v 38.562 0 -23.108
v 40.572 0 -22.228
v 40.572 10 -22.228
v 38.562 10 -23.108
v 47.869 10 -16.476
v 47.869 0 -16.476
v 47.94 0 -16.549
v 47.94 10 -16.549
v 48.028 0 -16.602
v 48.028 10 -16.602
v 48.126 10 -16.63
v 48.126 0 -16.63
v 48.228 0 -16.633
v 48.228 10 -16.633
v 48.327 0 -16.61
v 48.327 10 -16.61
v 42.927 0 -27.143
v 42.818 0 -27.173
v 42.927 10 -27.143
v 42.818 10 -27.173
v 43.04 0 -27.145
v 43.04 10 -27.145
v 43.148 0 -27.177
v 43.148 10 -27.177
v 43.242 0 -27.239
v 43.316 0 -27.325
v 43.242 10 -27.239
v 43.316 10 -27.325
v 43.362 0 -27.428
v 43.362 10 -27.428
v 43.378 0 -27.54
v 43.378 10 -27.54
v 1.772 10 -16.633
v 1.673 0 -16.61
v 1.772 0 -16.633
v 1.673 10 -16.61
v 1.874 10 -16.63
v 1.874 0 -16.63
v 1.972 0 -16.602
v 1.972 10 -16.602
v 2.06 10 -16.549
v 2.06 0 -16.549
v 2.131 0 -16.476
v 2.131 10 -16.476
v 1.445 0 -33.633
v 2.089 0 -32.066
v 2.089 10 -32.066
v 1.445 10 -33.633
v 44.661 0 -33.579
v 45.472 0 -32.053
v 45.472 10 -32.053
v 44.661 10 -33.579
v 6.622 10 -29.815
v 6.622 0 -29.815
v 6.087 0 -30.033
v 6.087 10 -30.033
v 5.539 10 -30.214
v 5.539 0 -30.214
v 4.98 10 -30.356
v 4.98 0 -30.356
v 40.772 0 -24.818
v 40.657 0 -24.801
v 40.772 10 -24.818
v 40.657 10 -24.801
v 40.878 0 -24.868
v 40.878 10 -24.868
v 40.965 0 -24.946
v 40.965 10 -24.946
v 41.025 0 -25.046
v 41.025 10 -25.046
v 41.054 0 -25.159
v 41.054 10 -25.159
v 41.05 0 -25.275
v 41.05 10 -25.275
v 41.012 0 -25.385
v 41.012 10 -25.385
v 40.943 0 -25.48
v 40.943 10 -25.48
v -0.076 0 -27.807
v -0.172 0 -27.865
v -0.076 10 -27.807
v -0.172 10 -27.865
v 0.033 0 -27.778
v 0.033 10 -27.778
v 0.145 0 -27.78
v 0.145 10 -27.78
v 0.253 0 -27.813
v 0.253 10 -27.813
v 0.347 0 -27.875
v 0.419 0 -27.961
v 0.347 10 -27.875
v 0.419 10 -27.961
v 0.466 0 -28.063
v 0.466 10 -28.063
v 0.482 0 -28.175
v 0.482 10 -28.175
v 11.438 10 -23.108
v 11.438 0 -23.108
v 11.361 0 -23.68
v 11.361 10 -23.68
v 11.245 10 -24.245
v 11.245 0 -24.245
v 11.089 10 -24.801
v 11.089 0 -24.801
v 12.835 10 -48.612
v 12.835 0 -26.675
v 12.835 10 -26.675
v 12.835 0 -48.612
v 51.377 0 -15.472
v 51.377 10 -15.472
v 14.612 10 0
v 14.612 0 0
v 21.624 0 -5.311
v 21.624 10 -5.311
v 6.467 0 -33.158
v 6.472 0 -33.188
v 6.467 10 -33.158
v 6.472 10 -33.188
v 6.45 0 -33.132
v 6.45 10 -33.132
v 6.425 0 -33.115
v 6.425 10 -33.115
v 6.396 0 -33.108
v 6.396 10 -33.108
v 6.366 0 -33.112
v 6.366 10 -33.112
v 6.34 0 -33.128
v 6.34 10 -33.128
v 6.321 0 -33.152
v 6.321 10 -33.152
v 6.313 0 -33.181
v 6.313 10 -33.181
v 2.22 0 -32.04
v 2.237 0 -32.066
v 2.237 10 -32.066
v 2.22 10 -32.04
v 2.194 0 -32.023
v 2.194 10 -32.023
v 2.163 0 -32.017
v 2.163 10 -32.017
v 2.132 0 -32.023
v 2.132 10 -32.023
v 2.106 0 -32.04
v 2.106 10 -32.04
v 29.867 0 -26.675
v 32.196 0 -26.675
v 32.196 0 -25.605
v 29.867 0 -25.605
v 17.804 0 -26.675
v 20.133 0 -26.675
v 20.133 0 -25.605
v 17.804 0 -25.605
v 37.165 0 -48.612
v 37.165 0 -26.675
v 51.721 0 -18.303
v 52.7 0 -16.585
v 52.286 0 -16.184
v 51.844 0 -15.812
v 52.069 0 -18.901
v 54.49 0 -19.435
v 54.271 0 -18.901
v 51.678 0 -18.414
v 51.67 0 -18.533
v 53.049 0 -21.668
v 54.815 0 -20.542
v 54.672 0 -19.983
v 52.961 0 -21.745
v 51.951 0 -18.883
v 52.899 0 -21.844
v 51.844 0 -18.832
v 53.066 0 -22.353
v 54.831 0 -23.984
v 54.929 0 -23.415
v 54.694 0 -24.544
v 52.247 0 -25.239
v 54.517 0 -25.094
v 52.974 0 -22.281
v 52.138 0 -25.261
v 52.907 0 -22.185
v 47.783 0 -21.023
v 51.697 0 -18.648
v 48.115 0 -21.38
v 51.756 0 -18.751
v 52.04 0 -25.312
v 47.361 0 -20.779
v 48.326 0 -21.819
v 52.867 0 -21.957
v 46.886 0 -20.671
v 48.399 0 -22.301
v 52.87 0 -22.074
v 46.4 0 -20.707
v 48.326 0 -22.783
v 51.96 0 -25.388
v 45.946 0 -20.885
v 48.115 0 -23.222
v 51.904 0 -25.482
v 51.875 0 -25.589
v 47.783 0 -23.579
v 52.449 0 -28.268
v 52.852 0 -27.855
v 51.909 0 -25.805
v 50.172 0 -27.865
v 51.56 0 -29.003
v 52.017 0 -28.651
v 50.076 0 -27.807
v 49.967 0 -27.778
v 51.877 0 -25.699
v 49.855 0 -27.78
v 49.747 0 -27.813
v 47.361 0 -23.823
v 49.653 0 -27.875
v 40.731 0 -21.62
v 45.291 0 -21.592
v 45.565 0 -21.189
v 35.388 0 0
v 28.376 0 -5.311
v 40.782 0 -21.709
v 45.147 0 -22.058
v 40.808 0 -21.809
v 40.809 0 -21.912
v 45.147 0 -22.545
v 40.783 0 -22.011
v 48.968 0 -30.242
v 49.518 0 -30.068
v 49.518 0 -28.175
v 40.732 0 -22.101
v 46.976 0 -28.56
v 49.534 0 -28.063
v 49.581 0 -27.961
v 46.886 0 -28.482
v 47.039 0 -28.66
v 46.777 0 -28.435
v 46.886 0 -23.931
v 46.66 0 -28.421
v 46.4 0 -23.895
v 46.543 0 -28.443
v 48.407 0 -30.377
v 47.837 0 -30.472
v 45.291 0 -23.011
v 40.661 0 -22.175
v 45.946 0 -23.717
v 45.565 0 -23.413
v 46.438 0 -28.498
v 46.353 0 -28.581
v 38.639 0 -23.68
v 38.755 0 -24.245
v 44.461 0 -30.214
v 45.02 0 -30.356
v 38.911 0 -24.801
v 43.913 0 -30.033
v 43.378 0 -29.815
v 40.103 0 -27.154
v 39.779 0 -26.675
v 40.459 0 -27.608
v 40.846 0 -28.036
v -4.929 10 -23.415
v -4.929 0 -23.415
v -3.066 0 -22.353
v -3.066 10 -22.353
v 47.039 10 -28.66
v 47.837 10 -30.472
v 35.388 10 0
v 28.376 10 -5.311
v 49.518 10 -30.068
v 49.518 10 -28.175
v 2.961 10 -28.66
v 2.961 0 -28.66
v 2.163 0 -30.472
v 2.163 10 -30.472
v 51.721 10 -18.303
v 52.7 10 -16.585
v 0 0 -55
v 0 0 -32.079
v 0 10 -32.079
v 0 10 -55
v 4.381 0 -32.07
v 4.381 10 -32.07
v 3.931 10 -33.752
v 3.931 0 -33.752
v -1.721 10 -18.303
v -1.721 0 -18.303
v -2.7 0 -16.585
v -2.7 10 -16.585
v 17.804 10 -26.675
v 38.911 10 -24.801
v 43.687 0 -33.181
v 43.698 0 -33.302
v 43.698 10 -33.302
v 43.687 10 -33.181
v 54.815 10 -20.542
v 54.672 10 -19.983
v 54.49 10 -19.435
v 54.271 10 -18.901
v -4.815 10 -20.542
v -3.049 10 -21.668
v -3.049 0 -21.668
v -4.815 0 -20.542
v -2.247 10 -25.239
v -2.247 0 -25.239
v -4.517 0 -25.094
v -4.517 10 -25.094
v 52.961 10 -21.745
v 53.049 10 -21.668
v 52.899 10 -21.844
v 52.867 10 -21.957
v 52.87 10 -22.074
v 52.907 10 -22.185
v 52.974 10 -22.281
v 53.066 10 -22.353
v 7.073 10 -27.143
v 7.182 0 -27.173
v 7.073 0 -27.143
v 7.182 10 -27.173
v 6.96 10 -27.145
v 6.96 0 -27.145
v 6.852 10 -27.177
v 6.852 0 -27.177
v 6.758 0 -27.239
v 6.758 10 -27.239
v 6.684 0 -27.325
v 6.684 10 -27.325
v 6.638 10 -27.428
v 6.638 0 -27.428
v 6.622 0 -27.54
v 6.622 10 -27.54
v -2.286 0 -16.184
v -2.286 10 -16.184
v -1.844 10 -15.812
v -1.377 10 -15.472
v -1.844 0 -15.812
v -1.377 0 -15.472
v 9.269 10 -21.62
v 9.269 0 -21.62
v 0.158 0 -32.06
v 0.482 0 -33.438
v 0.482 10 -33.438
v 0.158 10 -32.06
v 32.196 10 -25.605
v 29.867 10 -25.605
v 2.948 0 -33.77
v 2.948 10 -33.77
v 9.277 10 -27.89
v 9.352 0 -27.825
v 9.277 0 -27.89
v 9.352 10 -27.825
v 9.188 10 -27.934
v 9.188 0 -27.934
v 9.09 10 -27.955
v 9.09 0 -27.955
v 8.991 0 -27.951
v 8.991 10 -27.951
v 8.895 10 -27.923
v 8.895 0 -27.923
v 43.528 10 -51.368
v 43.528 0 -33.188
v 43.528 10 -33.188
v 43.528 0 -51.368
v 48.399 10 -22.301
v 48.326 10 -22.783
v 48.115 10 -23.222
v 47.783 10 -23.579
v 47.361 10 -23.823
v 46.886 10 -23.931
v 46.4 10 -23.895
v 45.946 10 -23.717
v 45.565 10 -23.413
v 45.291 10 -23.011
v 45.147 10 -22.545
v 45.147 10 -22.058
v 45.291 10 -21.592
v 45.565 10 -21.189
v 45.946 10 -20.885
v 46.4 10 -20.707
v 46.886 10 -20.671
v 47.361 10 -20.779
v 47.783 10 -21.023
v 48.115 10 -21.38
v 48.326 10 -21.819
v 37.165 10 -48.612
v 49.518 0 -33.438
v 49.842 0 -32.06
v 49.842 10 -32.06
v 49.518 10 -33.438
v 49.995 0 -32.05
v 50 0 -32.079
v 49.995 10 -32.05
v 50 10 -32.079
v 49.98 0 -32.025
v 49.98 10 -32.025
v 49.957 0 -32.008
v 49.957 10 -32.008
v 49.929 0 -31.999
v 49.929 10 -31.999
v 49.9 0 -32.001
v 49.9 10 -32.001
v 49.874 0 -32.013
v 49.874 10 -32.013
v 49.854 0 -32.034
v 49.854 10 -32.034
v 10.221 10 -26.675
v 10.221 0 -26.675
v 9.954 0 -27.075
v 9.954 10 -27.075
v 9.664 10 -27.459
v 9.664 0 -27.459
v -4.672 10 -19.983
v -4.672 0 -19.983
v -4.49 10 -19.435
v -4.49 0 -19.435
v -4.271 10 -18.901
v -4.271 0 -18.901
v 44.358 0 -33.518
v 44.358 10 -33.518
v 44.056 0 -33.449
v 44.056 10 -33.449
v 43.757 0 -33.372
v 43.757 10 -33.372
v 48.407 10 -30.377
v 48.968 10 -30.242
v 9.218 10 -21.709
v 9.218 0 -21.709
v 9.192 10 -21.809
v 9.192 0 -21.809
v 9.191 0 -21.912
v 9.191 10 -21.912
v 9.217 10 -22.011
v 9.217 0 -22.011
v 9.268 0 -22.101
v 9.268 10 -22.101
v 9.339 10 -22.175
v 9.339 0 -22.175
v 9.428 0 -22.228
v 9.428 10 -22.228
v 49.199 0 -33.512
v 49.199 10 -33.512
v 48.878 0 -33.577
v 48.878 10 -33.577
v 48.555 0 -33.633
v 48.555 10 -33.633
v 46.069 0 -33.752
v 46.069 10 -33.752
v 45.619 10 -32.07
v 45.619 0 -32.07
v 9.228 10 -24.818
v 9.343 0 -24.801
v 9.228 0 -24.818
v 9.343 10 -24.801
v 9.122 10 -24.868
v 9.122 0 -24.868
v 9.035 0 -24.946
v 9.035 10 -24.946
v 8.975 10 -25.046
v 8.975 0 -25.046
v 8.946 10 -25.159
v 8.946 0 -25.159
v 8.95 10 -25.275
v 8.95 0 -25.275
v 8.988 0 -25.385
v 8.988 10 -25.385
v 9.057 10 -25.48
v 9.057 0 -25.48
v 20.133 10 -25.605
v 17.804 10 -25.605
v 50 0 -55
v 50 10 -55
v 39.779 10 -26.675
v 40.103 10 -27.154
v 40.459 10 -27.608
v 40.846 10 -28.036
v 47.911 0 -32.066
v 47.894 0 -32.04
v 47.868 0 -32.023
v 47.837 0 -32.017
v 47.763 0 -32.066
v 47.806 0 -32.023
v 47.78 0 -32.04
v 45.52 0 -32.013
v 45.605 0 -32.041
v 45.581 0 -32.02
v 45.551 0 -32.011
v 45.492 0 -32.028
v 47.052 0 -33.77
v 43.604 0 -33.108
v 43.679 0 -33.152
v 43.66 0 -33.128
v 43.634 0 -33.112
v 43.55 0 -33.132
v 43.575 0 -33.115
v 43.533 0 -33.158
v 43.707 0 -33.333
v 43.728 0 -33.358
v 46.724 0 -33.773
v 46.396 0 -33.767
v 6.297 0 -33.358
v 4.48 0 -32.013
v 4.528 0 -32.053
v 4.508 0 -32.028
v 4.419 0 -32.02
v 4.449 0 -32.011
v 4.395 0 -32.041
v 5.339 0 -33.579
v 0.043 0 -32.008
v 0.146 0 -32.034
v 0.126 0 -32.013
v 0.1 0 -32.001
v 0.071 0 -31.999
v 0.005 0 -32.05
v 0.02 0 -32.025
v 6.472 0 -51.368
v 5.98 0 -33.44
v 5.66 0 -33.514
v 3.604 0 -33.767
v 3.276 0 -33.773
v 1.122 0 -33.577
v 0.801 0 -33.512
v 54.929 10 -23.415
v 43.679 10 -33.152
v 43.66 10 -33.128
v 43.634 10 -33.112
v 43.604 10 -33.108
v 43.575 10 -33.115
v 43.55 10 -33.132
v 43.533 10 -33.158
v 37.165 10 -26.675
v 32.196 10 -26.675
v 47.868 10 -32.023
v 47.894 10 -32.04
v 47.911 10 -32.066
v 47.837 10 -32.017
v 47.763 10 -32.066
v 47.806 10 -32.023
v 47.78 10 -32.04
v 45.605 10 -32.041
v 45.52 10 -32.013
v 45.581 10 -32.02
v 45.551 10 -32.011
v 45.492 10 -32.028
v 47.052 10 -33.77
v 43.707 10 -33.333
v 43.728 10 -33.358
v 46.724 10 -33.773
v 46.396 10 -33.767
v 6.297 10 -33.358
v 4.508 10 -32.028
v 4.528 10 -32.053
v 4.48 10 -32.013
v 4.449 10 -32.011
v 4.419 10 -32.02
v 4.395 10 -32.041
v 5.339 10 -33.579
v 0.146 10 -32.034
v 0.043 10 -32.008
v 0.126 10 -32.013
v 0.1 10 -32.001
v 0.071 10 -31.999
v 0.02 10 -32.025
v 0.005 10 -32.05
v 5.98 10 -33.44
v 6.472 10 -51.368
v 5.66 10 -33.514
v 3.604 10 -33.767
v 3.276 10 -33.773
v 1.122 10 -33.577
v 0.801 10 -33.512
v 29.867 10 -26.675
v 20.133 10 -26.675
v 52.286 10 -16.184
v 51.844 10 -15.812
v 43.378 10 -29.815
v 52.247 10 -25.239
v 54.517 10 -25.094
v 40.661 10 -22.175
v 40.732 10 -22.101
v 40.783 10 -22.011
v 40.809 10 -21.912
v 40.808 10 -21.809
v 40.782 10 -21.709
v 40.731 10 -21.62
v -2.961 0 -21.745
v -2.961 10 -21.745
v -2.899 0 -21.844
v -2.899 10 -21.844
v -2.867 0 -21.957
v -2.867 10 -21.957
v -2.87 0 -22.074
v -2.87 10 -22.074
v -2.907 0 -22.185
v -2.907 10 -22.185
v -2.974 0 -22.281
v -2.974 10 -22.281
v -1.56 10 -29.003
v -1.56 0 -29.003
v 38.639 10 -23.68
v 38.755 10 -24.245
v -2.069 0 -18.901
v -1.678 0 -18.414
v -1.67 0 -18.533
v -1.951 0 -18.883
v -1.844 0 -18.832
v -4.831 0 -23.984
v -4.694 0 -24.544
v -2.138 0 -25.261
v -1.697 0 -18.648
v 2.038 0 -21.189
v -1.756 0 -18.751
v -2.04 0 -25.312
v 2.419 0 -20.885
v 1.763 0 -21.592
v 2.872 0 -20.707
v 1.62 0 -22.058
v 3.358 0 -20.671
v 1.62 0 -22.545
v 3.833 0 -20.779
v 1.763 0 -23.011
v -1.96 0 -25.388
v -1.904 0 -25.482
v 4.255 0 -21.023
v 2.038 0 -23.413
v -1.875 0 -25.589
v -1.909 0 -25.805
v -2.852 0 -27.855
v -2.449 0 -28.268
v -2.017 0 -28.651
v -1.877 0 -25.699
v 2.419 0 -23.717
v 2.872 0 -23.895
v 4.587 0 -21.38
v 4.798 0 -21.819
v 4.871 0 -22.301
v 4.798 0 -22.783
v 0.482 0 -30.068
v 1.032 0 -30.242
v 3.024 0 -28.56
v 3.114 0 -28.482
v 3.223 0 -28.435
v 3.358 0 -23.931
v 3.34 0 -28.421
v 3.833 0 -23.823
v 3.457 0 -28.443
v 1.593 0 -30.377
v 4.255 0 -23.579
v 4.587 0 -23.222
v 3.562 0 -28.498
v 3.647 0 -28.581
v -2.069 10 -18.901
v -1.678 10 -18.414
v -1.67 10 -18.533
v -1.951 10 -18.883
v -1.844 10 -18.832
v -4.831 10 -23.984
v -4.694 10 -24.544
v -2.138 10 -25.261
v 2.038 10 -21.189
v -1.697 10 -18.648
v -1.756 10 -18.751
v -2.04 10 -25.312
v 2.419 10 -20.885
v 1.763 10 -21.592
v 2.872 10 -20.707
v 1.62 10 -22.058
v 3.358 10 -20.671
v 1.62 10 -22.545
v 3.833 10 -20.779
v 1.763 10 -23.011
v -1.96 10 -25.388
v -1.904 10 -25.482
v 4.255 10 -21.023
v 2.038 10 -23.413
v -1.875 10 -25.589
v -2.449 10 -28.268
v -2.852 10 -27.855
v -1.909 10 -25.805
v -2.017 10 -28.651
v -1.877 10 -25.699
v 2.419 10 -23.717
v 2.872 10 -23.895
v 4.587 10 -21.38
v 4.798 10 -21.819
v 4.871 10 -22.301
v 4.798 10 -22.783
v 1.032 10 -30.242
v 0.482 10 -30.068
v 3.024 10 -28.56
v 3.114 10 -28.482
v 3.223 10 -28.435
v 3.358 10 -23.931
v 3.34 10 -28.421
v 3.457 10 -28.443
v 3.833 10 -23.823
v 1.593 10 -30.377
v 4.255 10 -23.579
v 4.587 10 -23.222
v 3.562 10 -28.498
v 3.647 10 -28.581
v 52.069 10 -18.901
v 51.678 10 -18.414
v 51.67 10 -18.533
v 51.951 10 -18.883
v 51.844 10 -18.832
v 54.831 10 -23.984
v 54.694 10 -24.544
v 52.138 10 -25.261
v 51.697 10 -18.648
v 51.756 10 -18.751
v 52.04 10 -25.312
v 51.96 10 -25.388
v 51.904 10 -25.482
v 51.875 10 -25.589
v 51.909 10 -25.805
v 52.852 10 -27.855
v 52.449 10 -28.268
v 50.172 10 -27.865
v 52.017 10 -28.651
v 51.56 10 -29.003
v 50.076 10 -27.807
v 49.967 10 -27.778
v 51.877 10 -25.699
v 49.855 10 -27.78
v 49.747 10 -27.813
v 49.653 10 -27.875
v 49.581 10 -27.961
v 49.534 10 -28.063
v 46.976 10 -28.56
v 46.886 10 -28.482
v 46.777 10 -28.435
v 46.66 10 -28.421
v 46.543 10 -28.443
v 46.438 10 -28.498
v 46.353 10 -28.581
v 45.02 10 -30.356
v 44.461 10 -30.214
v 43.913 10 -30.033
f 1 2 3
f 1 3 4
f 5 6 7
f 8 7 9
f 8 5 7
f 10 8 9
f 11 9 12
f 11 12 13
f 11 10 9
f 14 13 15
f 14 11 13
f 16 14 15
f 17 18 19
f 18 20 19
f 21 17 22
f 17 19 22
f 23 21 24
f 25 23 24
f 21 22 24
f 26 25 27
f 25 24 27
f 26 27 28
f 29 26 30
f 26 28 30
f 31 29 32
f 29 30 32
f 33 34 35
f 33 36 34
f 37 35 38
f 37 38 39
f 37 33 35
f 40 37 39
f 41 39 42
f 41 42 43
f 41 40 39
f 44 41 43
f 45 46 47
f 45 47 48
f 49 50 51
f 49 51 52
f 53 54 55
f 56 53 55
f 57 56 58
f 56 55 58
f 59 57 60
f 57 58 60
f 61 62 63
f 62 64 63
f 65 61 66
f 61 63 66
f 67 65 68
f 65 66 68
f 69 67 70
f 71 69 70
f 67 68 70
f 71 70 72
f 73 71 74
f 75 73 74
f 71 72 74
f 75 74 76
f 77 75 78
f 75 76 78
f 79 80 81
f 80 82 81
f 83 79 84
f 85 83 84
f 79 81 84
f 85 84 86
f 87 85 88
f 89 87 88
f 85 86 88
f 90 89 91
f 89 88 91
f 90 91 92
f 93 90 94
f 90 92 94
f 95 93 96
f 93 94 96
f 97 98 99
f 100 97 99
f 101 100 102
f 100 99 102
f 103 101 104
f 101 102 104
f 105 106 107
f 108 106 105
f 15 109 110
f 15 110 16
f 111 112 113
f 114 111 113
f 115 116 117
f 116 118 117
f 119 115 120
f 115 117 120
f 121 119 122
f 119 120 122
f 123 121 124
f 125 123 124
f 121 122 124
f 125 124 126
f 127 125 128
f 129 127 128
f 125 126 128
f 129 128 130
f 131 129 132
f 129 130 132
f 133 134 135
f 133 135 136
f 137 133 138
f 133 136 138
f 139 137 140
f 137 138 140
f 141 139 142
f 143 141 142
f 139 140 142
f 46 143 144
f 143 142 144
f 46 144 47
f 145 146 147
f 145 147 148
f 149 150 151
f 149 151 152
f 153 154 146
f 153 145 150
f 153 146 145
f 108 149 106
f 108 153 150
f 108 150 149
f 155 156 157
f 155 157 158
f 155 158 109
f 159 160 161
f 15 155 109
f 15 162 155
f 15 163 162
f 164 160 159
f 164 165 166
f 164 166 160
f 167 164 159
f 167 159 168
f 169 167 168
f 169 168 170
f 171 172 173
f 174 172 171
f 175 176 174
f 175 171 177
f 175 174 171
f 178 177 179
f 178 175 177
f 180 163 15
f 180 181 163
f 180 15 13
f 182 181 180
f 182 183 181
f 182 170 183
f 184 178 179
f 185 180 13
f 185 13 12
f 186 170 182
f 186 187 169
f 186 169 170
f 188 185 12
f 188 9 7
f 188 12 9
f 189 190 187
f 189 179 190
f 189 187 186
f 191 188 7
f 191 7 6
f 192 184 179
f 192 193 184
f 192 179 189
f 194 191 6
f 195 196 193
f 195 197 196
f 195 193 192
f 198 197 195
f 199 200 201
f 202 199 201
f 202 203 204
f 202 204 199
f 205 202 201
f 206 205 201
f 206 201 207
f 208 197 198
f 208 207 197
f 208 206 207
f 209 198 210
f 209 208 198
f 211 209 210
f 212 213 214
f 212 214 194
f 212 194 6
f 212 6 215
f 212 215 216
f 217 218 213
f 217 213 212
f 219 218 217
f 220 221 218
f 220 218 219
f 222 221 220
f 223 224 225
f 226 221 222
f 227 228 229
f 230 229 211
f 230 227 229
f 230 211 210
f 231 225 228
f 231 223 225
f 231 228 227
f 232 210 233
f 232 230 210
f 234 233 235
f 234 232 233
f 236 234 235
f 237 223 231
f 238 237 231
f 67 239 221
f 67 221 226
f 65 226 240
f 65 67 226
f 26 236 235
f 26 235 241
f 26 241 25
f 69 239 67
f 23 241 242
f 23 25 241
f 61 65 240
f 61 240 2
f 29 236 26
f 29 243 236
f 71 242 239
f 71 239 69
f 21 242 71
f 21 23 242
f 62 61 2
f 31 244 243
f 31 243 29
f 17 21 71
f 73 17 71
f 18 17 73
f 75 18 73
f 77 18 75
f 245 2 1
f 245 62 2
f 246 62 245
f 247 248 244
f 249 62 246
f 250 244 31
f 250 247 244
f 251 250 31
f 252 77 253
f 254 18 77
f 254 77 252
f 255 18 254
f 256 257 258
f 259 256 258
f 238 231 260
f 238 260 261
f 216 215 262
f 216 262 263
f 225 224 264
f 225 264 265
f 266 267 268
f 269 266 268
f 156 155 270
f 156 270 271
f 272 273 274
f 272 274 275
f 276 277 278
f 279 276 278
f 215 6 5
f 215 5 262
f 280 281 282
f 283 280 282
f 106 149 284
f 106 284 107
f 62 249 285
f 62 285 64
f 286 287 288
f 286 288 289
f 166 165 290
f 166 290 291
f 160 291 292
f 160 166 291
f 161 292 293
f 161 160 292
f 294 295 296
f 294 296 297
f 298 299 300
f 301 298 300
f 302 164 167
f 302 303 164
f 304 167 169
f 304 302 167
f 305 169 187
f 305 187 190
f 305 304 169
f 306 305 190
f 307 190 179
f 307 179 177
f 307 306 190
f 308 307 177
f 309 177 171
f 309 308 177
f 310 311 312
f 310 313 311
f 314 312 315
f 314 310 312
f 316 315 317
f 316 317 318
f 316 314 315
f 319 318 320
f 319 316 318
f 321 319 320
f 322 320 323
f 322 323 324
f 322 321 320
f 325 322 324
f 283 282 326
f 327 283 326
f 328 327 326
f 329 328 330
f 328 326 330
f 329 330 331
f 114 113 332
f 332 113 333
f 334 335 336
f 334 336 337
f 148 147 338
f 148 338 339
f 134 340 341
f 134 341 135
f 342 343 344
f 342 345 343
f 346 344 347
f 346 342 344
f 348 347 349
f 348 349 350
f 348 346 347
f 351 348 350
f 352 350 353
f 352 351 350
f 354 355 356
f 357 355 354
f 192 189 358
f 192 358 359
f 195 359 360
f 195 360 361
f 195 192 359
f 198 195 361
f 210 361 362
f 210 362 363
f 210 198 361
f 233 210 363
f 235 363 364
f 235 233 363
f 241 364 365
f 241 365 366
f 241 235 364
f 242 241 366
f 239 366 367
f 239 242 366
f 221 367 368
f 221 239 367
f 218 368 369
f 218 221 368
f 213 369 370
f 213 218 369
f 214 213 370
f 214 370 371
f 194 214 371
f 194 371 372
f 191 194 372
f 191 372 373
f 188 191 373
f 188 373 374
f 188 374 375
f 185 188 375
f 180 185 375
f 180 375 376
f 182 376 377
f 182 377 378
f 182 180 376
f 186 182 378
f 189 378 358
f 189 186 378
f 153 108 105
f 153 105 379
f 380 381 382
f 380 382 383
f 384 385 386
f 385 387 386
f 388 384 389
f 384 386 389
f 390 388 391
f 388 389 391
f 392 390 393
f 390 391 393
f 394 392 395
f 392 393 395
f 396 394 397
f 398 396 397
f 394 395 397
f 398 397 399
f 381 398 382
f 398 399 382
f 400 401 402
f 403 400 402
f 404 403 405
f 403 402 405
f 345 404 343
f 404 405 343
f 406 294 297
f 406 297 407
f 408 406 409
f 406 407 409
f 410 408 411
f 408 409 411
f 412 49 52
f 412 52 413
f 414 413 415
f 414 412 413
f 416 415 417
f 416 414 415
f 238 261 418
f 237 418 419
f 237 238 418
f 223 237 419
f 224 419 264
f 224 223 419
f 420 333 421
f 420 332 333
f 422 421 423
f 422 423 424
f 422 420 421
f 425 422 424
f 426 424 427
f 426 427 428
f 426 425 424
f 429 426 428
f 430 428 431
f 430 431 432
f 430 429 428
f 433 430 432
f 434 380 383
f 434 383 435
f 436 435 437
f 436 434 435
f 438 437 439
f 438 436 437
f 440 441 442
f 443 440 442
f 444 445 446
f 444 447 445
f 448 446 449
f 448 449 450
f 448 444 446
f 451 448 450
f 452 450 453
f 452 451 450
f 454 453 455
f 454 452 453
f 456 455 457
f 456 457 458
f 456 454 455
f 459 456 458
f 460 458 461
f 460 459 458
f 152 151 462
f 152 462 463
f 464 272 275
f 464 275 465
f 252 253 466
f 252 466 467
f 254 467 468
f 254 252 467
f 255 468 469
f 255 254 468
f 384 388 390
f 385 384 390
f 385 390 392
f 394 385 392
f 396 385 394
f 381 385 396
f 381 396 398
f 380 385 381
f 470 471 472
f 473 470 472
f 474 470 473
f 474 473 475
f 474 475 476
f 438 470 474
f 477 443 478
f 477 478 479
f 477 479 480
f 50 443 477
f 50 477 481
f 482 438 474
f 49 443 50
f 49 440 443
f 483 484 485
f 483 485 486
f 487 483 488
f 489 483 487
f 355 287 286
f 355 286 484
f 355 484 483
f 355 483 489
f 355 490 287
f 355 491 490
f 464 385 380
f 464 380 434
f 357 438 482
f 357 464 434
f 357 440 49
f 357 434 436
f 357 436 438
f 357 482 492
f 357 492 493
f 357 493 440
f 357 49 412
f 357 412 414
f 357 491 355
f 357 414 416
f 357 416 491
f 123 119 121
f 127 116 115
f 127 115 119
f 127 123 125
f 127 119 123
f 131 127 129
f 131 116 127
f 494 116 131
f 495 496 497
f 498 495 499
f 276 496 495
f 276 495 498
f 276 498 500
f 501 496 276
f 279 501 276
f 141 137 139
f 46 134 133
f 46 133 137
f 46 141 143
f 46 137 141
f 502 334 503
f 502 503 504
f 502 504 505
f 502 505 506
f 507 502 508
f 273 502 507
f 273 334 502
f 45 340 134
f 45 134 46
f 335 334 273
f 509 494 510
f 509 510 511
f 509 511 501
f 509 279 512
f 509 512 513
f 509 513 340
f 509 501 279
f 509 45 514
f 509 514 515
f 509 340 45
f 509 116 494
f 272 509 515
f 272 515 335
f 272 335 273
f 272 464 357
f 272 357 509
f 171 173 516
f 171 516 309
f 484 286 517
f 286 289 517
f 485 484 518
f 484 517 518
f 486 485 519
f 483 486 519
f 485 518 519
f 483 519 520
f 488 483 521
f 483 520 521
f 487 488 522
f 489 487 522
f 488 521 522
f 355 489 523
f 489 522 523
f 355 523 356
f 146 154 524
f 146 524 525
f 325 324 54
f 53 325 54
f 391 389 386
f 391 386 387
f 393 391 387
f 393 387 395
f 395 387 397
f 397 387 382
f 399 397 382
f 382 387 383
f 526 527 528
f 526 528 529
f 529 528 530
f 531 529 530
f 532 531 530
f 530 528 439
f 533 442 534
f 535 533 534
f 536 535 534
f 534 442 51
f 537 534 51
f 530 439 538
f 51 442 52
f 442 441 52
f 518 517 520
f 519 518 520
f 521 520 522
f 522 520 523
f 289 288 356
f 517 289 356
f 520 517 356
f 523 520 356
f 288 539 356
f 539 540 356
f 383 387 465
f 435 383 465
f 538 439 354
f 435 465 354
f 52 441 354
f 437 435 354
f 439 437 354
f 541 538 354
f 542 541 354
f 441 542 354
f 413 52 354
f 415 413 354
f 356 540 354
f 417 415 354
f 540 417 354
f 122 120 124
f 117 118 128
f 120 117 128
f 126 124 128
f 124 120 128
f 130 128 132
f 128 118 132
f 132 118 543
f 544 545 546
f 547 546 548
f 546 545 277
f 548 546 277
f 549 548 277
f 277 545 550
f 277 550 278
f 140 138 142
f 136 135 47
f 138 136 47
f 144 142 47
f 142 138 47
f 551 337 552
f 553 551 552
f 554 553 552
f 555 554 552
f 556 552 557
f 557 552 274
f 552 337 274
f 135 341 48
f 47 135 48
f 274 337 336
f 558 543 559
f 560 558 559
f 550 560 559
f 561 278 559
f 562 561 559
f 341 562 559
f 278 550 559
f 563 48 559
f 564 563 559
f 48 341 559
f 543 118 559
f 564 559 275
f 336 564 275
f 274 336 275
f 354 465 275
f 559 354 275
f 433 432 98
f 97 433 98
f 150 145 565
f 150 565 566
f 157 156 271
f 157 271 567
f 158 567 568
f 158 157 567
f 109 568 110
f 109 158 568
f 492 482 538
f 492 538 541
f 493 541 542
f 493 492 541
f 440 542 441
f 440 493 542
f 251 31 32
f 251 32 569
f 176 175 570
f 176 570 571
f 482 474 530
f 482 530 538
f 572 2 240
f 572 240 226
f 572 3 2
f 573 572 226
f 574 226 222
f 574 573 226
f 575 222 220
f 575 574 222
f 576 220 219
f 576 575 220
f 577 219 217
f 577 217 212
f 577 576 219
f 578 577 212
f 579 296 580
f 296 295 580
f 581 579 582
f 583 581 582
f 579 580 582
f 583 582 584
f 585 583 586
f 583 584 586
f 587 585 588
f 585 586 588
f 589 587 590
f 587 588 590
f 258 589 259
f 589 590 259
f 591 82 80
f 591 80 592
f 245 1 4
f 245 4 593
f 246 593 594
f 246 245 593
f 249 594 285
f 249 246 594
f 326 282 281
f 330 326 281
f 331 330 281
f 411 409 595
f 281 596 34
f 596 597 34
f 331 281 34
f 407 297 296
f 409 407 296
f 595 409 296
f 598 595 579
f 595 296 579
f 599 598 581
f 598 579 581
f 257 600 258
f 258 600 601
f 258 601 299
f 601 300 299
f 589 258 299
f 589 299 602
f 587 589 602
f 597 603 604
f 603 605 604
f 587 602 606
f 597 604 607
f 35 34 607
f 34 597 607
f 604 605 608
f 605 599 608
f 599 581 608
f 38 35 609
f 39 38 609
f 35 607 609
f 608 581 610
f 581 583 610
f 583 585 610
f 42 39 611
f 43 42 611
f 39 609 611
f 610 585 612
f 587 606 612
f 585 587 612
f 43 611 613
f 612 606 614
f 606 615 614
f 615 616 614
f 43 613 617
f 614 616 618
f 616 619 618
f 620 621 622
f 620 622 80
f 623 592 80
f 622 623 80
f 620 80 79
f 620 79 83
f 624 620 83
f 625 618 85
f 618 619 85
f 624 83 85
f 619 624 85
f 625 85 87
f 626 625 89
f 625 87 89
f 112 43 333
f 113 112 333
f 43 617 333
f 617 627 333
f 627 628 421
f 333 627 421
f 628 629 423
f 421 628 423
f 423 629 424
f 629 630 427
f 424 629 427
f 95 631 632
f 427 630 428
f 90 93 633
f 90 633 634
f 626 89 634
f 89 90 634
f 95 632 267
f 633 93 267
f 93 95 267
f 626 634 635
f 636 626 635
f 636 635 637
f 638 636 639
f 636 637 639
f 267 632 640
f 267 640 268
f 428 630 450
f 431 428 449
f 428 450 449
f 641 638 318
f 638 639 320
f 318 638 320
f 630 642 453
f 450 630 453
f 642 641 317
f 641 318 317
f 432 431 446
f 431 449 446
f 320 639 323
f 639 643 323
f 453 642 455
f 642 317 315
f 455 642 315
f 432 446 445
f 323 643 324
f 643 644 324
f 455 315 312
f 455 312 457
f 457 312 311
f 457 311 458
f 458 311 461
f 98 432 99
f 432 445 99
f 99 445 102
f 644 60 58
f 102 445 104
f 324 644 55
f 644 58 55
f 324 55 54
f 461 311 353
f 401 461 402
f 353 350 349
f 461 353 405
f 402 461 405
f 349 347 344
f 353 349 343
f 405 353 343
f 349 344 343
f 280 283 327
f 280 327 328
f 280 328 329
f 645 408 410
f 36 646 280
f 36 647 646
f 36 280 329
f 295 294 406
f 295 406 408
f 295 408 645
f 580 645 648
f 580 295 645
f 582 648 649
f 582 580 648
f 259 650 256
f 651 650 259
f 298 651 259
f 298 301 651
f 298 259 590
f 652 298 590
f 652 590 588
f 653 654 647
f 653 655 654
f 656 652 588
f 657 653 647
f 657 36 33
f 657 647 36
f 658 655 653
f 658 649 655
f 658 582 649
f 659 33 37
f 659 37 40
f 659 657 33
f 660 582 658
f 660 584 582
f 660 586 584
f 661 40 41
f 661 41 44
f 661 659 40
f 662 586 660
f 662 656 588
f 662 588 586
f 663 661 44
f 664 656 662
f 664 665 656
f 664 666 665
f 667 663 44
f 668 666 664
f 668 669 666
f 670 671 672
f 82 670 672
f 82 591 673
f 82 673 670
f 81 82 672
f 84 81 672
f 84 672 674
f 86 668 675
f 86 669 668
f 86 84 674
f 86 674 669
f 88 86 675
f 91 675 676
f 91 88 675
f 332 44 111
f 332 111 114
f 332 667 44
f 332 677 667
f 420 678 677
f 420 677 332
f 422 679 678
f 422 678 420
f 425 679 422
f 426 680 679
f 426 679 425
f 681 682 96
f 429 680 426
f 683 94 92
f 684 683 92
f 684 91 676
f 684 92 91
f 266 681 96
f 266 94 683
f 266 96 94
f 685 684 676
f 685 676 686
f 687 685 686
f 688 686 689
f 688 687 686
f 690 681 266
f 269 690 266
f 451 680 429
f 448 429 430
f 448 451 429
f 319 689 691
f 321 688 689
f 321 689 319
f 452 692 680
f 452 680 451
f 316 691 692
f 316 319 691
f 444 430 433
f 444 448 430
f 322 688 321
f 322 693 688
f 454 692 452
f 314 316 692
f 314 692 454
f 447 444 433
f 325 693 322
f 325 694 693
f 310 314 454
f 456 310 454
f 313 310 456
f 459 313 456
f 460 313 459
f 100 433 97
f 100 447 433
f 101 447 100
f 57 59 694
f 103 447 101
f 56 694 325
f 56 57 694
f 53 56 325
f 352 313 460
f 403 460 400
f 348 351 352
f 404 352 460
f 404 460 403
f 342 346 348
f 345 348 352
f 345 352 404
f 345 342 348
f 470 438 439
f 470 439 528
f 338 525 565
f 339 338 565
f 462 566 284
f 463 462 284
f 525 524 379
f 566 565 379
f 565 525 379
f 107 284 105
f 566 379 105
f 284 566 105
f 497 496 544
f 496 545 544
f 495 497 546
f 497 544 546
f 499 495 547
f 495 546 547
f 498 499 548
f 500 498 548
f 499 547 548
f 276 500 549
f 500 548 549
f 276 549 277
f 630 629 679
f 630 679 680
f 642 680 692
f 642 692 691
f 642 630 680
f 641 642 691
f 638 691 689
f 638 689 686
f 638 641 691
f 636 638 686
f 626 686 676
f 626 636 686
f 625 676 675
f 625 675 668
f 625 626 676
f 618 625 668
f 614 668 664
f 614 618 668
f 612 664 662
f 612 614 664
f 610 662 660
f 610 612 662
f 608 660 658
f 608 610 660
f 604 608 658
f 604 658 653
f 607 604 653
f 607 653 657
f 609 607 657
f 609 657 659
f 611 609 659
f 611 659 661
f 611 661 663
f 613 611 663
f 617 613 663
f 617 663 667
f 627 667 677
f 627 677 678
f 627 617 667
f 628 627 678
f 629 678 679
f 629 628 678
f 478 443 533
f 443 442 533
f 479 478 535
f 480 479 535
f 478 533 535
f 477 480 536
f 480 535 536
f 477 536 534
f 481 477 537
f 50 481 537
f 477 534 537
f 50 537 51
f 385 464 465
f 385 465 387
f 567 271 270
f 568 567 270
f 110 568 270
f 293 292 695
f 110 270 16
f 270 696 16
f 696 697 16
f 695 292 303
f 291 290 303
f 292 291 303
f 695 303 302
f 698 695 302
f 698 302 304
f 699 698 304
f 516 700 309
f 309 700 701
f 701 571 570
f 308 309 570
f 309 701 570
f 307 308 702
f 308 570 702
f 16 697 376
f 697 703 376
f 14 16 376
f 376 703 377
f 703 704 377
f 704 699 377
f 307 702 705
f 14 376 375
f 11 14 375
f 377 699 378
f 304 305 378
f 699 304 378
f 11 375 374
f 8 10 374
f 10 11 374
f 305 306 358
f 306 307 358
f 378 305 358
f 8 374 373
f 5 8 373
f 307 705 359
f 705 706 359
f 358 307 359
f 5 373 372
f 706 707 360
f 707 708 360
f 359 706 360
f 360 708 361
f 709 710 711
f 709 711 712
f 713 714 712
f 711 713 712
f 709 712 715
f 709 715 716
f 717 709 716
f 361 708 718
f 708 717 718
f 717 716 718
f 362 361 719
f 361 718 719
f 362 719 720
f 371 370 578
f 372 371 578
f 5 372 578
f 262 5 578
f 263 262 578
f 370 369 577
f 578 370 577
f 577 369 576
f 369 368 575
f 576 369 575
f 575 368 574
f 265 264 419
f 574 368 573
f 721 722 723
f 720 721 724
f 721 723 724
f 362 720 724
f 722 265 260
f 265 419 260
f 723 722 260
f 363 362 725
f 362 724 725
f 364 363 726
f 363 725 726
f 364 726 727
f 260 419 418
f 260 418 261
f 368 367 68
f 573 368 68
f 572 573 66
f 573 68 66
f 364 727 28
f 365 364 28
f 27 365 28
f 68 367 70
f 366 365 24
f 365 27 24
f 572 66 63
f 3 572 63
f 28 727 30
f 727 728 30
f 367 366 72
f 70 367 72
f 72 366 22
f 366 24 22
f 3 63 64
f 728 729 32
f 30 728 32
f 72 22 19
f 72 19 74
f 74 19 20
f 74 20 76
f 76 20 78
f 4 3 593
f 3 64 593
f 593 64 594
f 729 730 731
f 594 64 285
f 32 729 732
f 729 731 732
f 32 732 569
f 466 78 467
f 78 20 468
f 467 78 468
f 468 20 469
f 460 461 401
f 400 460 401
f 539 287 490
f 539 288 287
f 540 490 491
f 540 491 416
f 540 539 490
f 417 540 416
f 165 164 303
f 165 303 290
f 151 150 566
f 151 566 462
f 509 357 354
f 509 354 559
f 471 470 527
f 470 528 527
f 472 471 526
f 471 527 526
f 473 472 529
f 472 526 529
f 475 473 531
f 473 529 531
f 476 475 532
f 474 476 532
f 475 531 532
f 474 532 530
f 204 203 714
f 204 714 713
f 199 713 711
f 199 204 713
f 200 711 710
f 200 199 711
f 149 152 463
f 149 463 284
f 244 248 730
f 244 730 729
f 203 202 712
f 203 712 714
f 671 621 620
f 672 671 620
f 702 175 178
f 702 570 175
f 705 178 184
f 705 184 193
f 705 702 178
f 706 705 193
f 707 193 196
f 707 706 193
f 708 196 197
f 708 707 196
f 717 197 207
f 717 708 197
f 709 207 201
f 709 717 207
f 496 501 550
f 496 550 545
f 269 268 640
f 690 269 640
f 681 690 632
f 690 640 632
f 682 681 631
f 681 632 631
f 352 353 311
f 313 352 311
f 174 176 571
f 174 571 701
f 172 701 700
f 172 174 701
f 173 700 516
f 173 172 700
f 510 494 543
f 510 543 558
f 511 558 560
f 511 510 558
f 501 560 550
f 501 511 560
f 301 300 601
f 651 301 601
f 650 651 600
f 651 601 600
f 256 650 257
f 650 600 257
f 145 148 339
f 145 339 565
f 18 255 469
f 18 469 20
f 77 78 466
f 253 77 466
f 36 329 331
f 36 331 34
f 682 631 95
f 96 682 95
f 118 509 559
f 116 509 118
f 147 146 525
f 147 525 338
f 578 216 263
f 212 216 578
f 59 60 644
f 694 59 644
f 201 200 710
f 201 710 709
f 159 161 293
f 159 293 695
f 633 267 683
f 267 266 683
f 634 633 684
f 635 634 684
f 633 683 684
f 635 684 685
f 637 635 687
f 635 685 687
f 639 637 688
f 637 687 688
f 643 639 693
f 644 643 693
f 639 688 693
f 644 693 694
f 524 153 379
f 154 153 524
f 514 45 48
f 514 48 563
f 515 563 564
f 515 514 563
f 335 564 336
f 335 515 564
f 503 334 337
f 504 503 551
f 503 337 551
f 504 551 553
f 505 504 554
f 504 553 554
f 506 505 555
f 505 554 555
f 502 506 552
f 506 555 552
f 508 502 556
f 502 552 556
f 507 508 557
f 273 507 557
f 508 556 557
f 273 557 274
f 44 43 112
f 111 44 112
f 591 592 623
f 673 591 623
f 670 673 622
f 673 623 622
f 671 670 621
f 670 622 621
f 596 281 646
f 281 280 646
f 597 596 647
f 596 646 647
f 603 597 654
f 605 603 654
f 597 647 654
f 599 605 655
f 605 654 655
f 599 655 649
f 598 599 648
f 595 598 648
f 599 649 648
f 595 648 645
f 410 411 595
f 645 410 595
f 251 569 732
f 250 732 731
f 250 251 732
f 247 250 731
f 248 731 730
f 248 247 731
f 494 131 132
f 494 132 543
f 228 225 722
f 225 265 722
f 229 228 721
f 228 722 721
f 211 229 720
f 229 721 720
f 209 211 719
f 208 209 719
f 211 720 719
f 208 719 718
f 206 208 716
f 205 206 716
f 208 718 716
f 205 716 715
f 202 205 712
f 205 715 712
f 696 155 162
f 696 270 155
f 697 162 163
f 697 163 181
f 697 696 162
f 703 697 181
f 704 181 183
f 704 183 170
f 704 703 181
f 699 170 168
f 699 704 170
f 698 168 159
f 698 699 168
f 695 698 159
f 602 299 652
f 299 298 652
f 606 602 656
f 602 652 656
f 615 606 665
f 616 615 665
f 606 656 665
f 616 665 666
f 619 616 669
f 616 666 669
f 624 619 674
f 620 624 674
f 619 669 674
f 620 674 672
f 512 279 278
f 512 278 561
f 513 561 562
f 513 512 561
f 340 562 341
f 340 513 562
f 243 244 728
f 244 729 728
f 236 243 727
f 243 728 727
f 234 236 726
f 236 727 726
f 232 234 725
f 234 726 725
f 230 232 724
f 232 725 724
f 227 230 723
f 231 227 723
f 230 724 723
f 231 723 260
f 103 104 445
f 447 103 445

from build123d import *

# Parameters (mm, degrees)
BOSS_EXTRUDE1_DEPTH   = 10
SKETCH1_R             = 1.634862636
BOSS_EXTRUDE1_2_DEPTH = 10
BOSS_EXTRUDE1_3_DEPTH = 10
BOSS_EXTRUDE1_4_DEPTH = 10
FILLET3_R             = 0.08
FILLET4_R             = 0.4
FILLET5_R             = 0.4


with BuildPart() as part:
    # Sketch1 → Boss-Extrude1 (new body)
    with BuildSketch(Plane(origin=(0, 0, 0), x_dir=(1, 0, 0), z_dir=(0, 1, 0))):
        Polygon((37.164723878, 48.612251684), (37.164723878, 26.675451349), (32.195744528, 26.675451349), (32.195744528, 25.605091118), (29.866967358, 25.605091118), (29.866967358, 26.675451349), (20.133032642, 26.675451349), (20.133032642, 25.605091118), (17.804255472, 25.605091118), (17.804255472, 26.675451349), (12.835276122, 26.675451349), (12.835276122, 48.612251684), align=None)
    extrude(amount=BOSS_EXTRUDE1_DEPTH)


with BuildPart() as body_2:
    # Sketch1 → Boss-Extrude1 2 (new body)
    with BuildSketch(Plane(origin=(0, 0, 0), x_dir=(1, 0, 0), z_dir=(0, 1, 0))):
        with BuildLine():
            Line((-1.38016006, 18.901152594), (-2.700358537, 16.585087375))
            ThreePointArc((-2.700358537, 16.585087375), (-2.068010706, 15.993904553), (-1.377138562, 15.472314112))
            Line((-1.377138562, 15.472314112), (1.951668945, 16.713640495))
            Line((1.951668945, 16.713640495), (14.612447645, 0))
            Line((14.612447645, 0), (21.623536668, 5.310982164))
            Line((21.623536668, 5.310982164), (8.962757967, 22.024622659))
            Line((8.962757967, 22.024622659), (11.437701272, 23.107681531))
            ThreePointArc((11.437701272, 23.107681531), (11.307856053, 23.963544328), (11.088950356, 24.801065196))
            Line((11.088950356, 24.801065196), (8.395715441, 24.801065196))
            Line((8.395715441, 24.801065196), (10.220537046, 26.675451349))
            ThreePointArc((10.220537046, 26.675451349), (9.723160987, 27.383955382), (9.154209441, 28.036377827))
            Line((9.154209441, 28.036377827), (6.621696735, 26.928126035))
            Line((6.621696735, 26.928126035), (6.621696735, 29.8147682))
            ThreePointArc((6.621696735, 29.8147682), (5.814872257, 30.128448245), (4.979595029, 30.355764897))
            Line((4.979595029, 30.355764897), (3.236149851, 28.034465682))
            Line((3.236149851, 28.034465682), (2.162614812, 30.472071154))
            ThreePointArc((2.162614812, 30.472071154), (1.31144171, 30.314383932), (0.481505188, 30.068281764))
            Line((0.481505188, 30.068281764), (0.481505188, 27.329349922))
            Line((0.481505188, 27.329349922), (-1.55963707, 29.003146704))
            ThreePointArc((-1.55963707, 29.003146704), (-2.236190449, 28.463112969), (-2.852363875, 27.855090587))
            Line((-2.852363875, 27.855090587), (-1.665080257, 25.275821099))
            Line((-1.665080257, 25.275821099), (-4.517323151, 25.093949256))
            ThreePointArc((-4.517323151, 25.093949256), (-4.767499265, 24.26523168), (-4.92936582, 23.414843459))
            Line((-4.92936582, 23.414843459), (-2.490458264, 22.024622659))
            Line((-2.490458264, 22.024622659), (-4.815054435, 20.542207918))
            ThreePointArc((-4.815054435, 20.542207918), (-4.586127349, 19.70737063), (-4.270891903, 18.901152594))
            Line((-4.270891903, 18.901152594), (-1.38016006, 18.901152594))
        make_face()
        with Locations((3.236149851, 22.301183348)):
            Circle(SKETCH1_R, mode=Mode.SUBTRACT)
    extrude(amount=BOSS_EXTRUDE1_2_DEPTH)

    # Fillet4
    fillet4_edges = [body_2.edges().sort_by_distance(p)[0] for p in [
        (-1.38016006, 5, -18.901152594),
        (-2.490458264, 5, -22.024622659),
        (-1.665080257, 5, -25.275821099),
        (0.481505188, 5, -27.329349922),
        (3.236149851, 5, -28.034465682),
        (6.621696735, 5, -26.928126035),
        (9.154209441, 5, -28.036377827),
        (8.395715441, 5, -24.801065196),
        (8.962757967, 5, -22.024622659),
        (1.951668945, 5, -16.713640495),
    ]]
    fillet(fillet4_edges, radius=FILLET4_R)


with BuildPart() as body_3:
    # Sketch1 → Boss-Extrude1 3 (new body)
    with BuildSketch(Plane(origin=(0, 0, 0), x_dir=(1, 0, 0), z_dir=(0, 1, 0))):
        with BuildLine():
            Line((43.703141587, 33.357527321), (43.527700297, 31.388462981))
            Line((43.527700297, 31.388462981), (43.527700297, 33.307454883))
            Line((43.527700297, 33.307454883), (43.527700297, 51.368312567))
            Line((43.527700297, 51.368312567), (6.472299703, 51.368312567))
            Line((6.472299703, 51.368312567), (6.472299703, 33.307454883))
            Line((6.472299703, 33.307454883), (6.472299703, 31.388462981))
            Line((6.472299703, 31.388462981), (6.296858413, 33.357527321))
            ThreePointArc((6.296858413, 33.357527321), (5.820283882, 33.478523384), (5.338962403, 33.578987138))
            Line((5.338962403, 33.578987138), (4.433036227, 31.872953299))
            Line((4.433036227, 31.872953299), (3.931055376, 33.752287455))
            ThreePointArc((3.931055376, 33.752287455), (3.439738349, 33.771546493), (2.948047339, 33.769734952))
            Line((2.948047339, 33.769734952), (2.162614812, 31.887571589))
            Line((2.162614812, 31.887571589), (1.445144074, 33.632687099))
            ThreePointArc((1.445144074, 33.632687099), (0.961235169, 33.545534914), (0.481505188, 33.437727324))
            Line((0.481505188, 33.437727324), (0, 31.388462981))
            Line((0, 31.388462981), (0, 33.307454883))
            Line((0, 33.307454883), (0, 55))
            Line((0, 55), (50, 55))
            Line((50, 55), (50, 31.388462981))
            Line((50, 31.388462981), (49.518494812, 33.437727324))
            ThreePointArc((49.518494812, 33.437727324), (49.038764831, 33.545534914), (48.554855926, 33.632687099))
            Line((48.554855926, 33.632687099), (47.837385188, 31.887571589))
            Line((47.837385188, 31.887571589), (47.051952661, 33.769734952))
            ThreePointArc((47.051952661, 33.769734952), (46.560261651, 33.771546493), (46.068944624, 33.752287455))
            Line((46.068944624, 33.752287455), (45.566963773, 31.872953299))
            Line((45.566963773, 31.872953299), (44.661037597, 33.578987138))
            ThreePointArc((44.661037597, 33.578987138), (44.179716118, 33.478523384), (43.703141587, 33.357527321))
        make_face()
    extrude(amount=BOSS_EXTRUDE1_3_DEPTH)

    # Fillet3
    fillet3_edges = [body_3.edges().sort_by_distance(p)[0] for p in [
        (43.527700297, 5, -31.388462981),
        (6.472299703, 5, -31.388462981),
        (4.433036227, 5, -31.872953299),
        (2.162614812, 5, -31.887571589),
        (0, 5, -31.388462981),
        (50, 5, -31.388462981),
        (47.837385188, 5, -31.887571589),
        (45.566963773, 5, -31.872953299),
        (43.703141587, 5, -33.357527321),
    ]]
    fillet(fillet3_edges, radius=FILLET3_R)


with BuildPart() as body_4:
    # Sketch1 → Boss-Extrude1 4 (new body)
    with BuildSketch(Plane(origin=(0, 0, 0), x_dir=(1, 0, 0), z_dir=(0, 1, 0))):
        with BuildLine():
            ThreePointArc((38.562298728, 23.107681531), (38.692143947, 23.963544328), (38.911049644, 24.801065196))
            Line((38.911049644, 24.801065196), (41.604284559, 24.801065196))
            Line((41.604284559, 24.801065196), (39.779462954, 26.675451349))
            ThreePointArc((39.779462954, 26.675451349), (40.276839013, 27.383955382), (40.845790559, 28.036377827))
            Line((40.845790559, 28.036377827), (43.378303265, 26.928126035))
            Line((43.378303265, 26.928126035), (43.378303265, 29.8147682))
            ThreePointArc((43.378303265, 29.8147682), (44.185127743, 30.128448245), (45.020404971, 30.355764897))
            Line((45.020404971, 30.355764897), (46.763850149, 28.034465682))
            Line((46.763850149, 28.034465682), (47.837385188, 30.472071154))
            ThreePointArc((47.837385188, 30.472071154), (48.68855829, 30.314383932), (49.518494812, 30.068281764))
            Line((49.518494812, 30.068281764), (49.518494812, 27.329349922))
            Line((49.518494812, 27.329349922), (51.55963707, 29.003146704))
            ThreePointArc((51.55963707, 29.003146704), (52.236190449, 28.463112969), (52.852363875, 27.855090587))
            Line((52.852363875, 27.855090587), (51.665080257, 25.275821099))
            Line((51.665080257, 25.275821099), (54.517323151, 25.093949256))
            ThreePointArc((54.517323151, 25.093949256), (54.767499265, 24.26523168), (54.92936582, 23.414843459))
            Line((54.92936582, 23.414843459), (52.490458264, 22.024622659))
            Line((52.490458264, 22.024622659), (54.815054435, 20.542207918))
            ThreePointArc((54.815054435, 20.542207918), (54.586127349, 19.70737063), (54.270891903, 18.901152594))
            Line((54.270891903, 18.901152594), (51.38016006, 18.901152594))
            Line((51.38016006, 18.901152594), (52.700358537, 16.585087375))
            ThreePointArc((52.700358537, 16.585087375), (52.068010706, 15.993904553), (51.377138562, 15.472314112))
            Line((51.377138562, 15.472314112), (48.048331055, 16.713640495))
            Line((48.048331055, 16.713640495), (35.387552355, 0))
            Line((35.387552355, 0), (28.376463332, 5.310982164))
            Line((28.376463332, 5.310982164), (41.037242033, 22.024622659))
            Line((41.037242033, 22.024622659), (38.562298728, 23.107681531))
        make_face()
        with Locations((46.763850149, 22.301183348)):
            Circle(SKETCH1_R, mode=Mode.SUBTRACT)
    extrude(amount=BOSS_EXTRUDE1_4_DEPTH)

    # Fillet5
    fillet5_edges = [body_4.edges().sort_by_distance(p)[0] for p in [
        (41.604284559, 5, -24.801065196),
        (43.378303265, 5, -26.928126035),
        (46.763850149, 5, -28.034465682),
        (49.518494812, 5, -27.329349922),
        (51.665080257, 5, -25.275821099),
        (52.490458264, 5, -22.024622659),
        (51.38016006, 5, -18.901152594),
        (48.048331055, 5, -16.713640495),
        (41.037242033, 5, -22.024622659),
    ]]
    fillet(fillet5_edges, radius=FILLET5_R)


solid = Compound([part.part, body_2.part, body_3.part, body_4.part])
